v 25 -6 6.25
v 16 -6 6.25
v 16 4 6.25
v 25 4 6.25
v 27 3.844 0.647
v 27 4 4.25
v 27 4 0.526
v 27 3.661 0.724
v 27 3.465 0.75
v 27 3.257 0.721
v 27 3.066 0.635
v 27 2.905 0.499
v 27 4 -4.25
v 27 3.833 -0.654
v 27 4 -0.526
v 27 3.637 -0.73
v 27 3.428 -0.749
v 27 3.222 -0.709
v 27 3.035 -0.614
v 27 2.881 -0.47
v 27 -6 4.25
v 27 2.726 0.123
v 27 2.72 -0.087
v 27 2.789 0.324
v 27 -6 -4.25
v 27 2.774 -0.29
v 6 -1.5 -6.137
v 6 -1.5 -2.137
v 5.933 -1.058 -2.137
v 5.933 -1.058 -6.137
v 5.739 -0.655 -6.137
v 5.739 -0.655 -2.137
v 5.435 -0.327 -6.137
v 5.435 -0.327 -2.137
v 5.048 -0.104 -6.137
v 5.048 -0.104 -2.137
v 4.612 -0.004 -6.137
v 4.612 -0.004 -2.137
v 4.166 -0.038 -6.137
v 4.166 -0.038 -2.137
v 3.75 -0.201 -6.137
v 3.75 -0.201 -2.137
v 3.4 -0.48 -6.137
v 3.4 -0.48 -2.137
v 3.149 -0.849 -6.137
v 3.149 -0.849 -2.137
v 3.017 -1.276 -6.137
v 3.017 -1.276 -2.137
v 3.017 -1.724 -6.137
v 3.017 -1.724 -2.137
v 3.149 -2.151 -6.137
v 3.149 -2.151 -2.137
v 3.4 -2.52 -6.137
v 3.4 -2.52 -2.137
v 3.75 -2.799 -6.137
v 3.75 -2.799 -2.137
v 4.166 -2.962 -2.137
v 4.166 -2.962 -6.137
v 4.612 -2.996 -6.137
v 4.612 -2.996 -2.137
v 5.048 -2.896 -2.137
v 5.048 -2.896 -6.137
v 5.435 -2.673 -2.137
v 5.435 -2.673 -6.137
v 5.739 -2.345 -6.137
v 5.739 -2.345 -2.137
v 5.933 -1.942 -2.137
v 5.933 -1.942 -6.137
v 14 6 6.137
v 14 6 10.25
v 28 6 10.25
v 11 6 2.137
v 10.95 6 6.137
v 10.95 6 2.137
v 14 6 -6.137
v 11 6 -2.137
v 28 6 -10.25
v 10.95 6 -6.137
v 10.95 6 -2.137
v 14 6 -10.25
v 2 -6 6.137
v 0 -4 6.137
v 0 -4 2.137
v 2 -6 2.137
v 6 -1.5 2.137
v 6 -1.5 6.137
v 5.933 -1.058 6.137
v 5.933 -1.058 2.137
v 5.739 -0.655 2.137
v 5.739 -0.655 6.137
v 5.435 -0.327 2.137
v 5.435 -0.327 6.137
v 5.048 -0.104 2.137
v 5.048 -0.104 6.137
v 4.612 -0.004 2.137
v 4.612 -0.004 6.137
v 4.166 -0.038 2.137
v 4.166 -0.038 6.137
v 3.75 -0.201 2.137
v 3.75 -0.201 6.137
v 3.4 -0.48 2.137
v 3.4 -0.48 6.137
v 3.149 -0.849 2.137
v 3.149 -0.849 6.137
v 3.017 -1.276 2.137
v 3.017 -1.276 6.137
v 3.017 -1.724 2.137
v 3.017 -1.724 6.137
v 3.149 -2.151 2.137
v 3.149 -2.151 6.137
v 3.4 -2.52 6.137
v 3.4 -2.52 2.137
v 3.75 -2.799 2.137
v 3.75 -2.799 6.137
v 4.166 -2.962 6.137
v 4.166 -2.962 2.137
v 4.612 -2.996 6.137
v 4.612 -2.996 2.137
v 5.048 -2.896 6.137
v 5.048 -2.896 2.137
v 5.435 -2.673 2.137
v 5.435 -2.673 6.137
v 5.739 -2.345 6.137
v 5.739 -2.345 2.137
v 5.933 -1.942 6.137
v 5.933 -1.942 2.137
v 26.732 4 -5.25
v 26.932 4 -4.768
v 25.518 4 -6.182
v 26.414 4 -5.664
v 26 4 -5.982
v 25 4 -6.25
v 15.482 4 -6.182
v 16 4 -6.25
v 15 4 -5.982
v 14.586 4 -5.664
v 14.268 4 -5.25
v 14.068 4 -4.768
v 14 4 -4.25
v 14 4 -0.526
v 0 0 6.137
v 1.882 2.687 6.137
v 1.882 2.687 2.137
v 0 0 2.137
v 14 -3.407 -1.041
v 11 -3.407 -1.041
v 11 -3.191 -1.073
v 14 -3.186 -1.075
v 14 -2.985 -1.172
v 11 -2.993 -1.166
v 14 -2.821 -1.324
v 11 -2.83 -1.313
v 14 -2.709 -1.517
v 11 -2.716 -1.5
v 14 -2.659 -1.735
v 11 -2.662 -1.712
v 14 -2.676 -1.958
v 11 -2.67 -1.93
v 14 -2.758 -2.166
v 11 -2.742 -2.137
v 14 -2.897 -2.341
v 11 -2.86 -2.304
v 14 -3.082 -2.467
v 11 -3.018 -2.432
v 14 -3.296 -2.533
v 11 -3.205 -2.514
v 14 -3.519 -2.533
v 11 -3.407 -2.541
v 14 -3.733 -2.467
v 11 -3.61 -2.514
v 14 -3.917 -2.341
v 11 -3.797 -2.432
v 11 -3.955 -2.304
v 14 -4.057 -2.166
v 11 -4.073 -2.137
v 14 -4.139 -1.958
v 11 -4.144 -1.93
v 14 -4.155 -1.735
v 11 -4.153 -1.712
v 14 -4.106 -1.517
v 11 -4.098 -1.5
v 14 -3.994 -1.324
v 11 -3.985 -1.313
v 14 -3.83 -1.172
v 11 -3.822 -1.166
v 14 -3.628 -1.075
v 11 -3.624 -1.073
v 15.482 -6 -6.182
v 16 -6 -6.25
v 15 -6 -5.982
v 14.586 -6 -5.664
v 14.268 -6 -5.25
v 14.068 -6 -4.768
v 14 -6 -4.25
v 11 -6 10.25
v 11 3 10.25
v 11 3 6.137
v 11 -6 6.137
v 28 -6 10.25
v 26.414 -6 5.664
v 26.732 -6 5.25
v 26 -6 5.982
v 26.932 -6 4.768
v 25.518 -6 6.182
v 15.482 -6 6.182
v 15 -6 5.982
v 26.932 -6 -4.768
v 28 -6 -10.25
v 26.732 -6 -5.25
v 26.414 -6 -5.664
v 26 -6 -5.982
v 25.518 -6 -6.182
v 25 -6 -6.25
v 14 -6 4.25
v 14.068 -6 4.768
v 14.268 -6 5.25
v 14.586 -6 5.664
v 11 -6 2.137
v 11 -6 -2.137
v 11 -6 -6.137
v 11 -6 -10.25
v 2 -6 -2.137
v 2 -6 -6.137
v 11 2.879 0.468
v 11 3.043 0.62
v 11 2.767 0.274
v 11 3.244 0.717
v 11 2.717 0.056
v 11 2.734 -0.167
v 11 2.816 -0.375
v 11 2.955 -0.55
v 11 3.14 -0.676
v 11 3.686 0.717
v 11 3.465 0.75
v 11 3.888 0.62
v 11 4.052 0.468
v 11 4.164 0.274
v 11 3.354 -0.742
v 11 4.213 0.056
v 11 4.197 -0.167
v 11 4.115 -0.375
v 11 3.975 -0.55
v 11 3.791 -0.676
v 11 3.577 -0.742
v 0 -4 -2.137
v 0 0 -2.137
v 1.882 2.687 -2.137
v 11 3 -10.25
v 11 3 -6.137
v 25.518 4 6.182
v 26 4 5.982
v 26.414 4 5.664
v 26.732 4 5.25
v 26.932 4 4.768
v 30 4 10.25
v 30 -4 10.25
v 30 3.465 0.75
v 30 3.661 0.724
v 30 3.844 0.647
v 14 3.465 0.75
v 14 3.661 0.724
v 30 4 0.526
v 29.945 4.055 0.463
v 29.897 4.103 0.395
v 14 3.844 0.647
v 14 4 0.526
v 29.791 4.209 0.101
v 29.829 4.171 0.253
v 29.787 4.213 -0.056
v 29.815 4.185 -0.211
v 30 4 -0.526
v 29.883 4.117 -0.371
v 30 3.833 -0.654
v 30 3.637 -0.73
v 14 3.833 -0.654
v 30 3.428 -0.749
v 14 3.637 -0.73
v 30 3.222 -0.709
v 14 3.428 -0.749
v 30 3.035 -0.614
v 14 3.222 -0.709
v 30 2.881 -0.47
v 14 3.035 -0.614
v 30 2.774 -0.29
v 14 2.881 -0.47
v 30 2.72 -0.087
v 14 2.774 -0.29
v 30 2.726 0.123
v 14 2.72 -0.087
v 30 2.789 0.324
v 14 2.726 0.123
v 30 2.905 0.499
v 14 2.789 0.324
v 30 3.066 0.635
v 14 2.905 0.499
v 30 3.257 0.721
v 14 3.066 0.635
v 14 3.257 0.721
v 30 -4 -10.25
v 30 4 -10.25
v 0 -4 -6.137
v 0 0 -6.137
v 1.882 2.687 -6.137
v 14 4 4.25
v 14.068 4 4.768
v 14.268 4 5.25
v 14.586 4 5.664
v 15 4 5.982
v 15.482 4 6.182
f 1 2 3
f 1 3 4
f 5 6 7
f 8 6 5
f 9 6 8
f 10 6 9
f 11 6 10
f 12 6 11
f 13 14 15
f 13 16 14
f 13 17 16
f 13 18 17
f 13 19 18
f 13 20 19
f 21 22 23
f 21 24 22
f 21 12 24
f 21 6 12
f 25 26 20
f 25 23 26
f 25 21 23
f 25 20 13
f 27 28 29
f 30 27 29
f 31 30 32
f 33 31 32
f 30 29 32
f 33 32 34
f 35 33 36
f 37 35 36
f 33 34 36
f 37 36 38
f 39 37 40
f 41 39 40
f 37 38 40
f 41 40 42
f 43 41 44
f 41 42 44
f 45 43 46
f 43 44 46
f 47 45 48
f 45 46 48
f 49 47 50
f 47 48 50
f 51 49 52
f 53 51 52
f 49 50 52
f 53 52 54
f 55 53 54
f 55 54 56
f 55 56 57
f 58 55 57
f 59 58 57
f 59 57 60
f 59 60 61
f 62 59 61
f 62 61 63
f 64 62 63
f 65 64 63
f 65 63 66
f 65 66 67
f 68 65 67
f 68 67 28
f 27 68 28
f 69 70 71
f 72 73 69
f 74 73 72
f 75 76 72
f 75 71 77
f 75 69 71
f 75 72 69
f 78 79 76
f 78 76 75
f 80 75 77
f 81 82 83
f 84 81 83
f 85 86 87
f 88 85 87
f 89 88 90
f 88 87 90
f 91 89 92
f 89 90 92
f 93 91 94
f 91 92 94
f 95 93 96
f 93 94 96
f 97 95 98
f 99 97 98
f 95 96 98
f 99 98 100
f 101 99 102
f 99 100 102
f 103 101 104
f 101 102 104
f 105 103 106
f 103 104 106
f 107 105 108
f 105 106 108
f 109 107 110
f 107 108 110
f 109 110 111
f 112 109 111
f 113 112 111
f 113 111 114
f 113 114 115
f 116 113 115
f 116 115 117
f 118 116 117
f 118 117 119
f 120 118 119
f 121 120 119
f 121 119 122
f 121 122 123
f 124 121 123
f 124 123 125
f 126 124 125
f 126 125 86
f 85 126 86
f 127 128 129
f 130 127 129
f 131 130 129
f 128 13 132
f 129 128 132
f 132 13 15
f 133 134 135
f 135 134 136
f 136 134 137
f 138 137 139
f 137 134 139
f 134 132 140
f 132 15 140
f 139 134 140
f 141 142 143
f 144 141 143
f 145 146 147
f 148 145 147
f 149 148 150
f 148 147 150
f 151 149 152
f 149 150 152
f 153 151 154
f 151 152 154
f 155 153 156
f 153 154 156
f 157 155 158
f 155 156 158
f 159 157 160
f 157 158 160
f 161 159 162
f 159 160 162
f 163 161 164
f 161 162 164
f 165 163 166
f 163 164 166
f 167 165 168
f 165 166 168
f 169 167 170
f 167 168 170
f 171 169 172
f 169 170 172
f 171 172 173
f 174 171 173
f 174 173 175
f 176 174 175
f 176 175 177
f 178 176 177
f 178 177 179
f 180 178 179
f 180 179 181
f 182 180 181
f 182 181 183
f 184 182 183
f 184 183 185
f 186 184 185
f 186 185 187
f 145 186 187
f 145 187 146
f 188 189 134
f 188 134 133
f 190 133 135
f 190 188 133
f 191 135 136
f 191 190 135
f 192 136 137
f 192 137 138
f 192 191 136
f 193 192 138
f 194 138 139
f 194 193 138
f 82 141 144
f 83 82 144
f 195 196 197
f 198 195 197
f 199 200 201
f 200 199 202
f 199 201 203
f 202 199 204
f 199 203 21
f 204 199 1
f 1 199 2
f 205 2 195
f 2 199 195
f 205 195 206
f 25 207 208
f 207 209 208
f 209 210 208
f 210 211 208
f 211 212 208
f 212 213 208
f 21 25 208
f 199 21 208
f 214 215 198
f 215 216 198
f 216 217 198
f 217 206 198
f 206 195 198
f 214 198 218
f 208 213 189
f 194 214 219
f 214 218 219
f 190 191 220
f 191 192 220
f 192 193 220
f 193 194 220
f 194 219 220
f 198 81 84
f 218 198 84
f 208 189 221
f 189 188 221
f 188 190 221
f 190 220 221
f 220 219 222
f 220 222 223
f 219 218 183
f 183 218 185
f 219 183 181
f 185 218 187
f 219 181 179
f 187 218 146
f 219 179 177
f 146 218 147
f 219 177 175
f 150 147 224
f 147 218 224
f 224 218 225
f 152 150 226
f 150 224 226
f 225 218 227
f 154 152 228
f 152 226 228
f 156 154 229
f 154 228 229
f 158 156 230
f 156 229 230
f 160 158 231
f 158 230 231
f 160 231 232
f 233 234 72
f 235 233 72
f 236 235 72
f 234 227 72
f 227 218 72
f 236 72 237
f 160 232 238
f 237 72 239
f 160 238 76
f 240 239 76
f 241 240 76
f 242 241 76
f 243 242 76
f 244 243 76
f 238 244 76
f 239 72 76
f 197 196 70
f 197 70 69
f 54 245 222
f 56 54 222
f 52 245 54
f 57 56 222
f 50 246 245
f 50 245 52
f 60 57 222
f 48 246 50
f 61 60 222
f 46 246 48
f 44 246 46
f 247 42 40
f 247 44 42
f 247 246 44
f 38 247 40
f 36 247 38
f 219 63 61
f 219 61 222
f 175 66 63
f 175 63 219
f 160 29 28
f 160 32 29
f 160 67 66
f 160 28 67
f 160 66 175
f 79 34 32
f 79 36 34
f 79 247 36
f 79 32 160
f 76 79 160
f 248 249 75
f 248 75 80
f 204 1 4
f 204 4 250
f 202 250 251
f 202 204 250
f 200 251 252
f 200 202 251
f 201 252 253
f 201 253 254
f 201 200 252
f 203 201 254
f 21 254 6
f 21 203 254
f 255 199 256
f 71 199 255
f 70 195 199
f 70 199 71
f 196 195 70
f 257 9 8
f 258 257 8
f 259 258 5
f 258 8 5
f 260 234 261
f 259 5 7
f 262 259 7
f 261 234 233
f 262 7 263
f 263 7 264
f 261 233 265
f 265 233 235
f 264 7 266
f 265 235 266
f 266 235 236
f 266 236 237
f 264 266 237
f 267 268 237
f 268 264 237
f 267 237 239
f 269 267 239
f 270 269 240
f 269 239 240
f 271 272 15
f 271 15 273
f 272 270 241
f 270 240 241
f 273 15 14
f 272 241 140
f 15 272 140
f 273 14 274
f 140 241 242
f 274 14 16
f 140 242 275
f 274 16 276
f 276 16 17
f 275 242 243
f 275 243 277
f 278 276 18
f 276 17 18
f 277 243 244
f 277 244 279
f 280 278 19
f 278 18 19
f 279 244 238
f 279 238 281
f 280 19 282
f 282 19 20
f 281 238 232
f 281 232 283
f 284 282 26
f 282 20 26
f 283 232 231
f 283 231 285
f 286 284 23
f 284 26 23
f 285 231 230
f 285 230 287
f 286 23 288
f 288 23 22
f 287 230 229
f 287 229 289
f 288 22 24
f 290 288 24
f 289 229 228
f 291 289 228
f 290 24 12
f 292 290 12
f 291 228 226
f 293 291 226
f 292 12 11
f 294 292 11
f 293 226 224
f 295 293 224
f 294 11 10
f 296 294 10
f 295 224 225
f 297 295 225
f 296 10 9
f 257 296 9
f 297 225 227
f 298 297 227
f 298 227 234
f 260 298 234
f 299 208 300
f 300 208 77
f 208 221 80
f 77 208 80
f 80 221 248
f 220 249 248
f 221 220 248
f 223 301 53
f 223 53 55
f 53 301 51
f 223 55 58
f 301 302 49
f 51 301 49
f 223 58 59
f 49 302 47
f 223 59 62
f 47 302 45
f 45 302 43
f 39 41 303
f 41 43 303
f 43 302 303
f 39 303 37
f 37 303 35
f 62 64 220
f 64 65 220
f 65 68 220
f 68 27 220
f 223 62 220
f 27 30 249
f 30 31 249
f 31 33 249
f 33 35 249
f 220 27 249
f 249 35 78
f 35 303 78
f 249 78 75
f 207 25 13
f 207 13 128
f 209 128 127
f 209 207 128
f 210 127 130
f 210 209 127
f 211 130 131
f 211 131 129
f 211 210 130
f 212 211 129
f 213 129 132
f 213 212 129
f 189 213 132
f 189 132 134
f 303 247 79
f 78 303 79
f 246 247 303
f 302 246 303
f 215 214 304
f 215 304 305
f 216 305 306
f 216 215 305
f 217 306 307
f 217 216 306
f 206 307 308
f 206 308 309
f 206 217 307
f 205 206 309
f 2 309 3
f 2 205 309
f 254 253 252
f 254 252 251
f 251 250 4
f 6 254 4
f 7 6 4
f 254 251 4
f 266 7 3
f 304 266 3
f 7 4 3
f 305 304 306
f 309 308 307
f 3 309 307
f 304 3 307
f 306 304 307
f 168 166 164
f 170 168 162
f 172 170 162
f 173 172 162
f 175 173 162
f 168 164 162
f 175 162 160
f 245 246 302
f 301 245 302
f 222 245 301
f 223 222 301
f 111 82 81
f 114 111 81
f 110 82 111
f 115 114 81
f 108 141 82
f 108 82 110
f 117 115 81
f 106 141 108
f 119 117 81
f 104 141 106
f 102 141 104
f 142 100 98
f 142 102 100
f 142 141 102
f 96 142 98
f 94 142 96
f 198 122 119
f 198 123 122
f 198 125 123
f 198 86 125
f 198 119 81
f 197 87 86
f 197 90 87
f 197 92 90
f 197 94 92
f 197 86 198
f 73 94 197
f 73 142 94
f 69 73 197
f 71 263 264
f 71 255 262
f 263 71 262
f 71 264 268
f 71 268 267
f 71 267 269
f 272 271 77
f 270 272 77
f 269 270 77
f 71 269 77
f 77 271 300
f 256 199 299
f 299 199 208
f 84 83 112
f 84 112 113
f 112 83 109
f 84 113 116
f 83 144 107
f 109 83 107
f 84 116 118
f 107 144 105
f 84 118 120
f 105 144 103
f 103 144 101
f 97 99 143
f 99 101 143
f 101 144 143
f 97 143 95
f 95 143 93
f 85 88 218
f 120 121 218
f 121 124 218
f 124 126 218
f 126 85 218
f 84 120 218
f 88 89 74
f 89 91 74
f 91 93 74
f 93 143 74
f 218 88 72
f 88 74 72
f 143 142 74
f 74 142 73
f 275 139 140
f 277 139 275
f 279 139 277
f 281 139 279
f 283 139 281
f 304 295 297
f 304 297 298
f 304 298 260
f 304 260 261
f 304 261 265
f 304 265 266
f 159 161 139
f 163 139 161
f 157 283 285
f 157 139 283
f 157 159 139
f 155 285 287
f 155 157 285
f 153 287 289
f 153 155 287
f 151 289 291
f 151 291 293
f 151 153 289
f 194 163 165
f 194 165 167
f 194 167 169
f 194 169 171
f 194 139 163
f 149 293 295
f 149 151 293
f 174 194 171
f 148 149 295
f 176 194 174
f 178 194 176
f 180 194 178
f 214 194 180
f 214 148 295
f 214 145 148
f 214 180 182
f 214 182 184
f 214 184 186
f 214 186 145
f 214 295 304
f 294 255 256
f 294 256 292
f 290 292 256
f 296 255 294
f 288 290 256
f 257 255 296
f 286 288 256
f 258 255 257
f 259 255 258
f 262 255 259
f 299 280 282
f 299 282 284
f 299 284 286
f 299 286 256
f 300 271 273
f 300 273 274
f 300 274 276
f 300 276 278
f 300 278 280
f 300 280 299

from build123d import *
from OCP.BRepFilletAPI import BRepFilletAPI_MakeChamfer

# Parameters (mm, degrees)
SKETCH_2_W          = 20.5
SKETCH_2_H          = 12
EXTRUDE_1_DEPTH     = 30
SKETCH_3_W          = 22
SKETCH_3_H          = 4.27428741
CUT_EXTRUDE_1_DEPTH = 34.897824414
SKETCH_10_W         = 17.106520138
SKETCH_10_H         = 9.063555791
CUT_EXTRUDE_3_DEPTH = 34.897824414
SKETCH_11_R         = 1.5
CUT_EXTRUDE_6_DEPTH = 35.706461629
SKETCH_12_R         = 0.75
CUT_EXTRUDE_4_DEPTH = 12
CUT_EXTRUDE_7_DEPTH = 37.827299657
CHAMFER_5_SIZE      = 2
CHAMFER_6_SIZE      = 2
CHAMFER_6_SIZE2     = 2.003351387
SKETCH_14_R         = 0.75
CUT_EXTRUDE_5_DEPTH = 23.406751215
CHAMFER_8_SIZE      = 3
CUT_EXTRUDE_8_DEPTH = 10


with BuildPart() as part:
    # Эскиз2 → Вытянуть1 (new body)
    with BuildSketch(Plane(origin=(0, 0, 0), x_dir=(0, 0, -1), z_dir=(1, 0, 0))):
        Rectangle(SKETCH_2_W, SKETCH_2_H)
    extrude(amount=EXTRUDE_1_DEPTH)

    # Эскиз3 → Вырез-Вытянуть1 (cut, through all)
    with BuildSketch(Plane(origin=(0, 6, 0), x_dir=(1, 0, 0), z_dir=(0, 1, 0))):
        Rectangle(SKETCH_3_W, SKETCH_3_H)
    extrude(amount=-CUT_EXTRUDE_1_DEPTH, mode=Mode.SUBTRACT)

    # Эскиз10 → Вырез-Вытянуть3 (cut, through all)
    with BuildSketch(Plane(origin=(0, 6, 0), x_dir=(1, 0, 0), z_dir=(0, 1, 0))):
        with Locations((2.446739931, 10.668921601)):
            Rectangle(SKETCH_10_W, SKETCH_10_H)
        with Locations((2.446739931, -10.668921601)):
            Rectangle(SKETCH_10_W, SKETCH_10_H)
    extrude(amount=-CUT_EXTRUDE_3_DEPTH, mode=Mode.SUBTRACT)

    # Эскиз11 → Вытянуть6 (cut, through all)
    with BuildSketch(Plane.XY.offset(6.137143705)):
        with Locations((4.5, -1.5)):
            Circle(SKETCH_11_R)
    extrude(amount=-CUT_EXTRUDE_6_DEPTH, mode=Mode.SUBTRACT)

    # Эскиз12 → Вырез-Вытянуть4 (cut)
    with BuildSketch(Plane.ZY.offset(-11)):
        with Locations((-1.791386219, -3.407348241)):
            Circle(SKETCH_12_R)
    extrude(amount=-CUT_EXTRUDE_4_DEPTH, mode=Mode.SUBTRACT)

    # Эскиз13 → Вытянуть7 (cut, through all)
    with BuildSketch(Plane.XY.offset(10.25)):
        Polygon((10.95, 6), (0, 6), (0, 2), align=None)
        Polygon((40.005782236, 6), (40.005782236, 2), (30.005782236, 6), align=None)
    extrude(amount=-CUT_EXTRUDE_7_DEPTH, mode=Mode.SUBTRACT)

    # Фаска5
    chamfer_5_edges = [part.edges().sort_by_distance(p)[0] for p in [
        (30, -6, 0),
        (0, -6, -4.137143705),
        (0, -6, 4.137143705),
        (30, 6, 0),
    ]]
    chamfer(chamfer_5_edges, length=CHAMFER_5_SIZE)

    # Фаска6: one chamfer whose edges measure the first distance from different faces: ONE call of the kernel's chamfer builder (chamfer() names one face for all edges)
    chamfer_6_edges_1 = [part.edges().sort_by_distance(p)[0] for p in [
        (0, 2, 4.137143705),
    ]]
    chamfer_6_side_1 = [part.faces().sort_by_distance(p)[0] for p in [
        (0, -1, 4.137143705),
    ]]
    chamfer_6_edges_2 = [part.edges().sort_by_distance(p)[0] for p in [
        (0, 2, -4.137143705),
    ]]
    chamfer_6_side_2 = [part.faces().sort_by_distance(p)[0] for p in [
        (0, -1, -4.137143705),
    ]]
    chamfer_6 = BRepFilletAPI_MakeChamfer(part.part.solid().wrapped)
    for e in chamfer_6_edges_1:
        chamfer_6.Add(CHAMFER_6_SIZE, CHAMFER_6_SIZE2, e.wrapped, chamfer_6_side_1[0].wrapped)  # the first distance lies on this face
    for e in chamfer_6_edges_2:
        chamfer_6.Add(CHAMFER_6_SIZE, CHAMFER_6_SIZE2, e.wrapped, chamfer_6_side_2[0].wrapped)  # the first distance lies on this face
    add(Compound.cast(chamfer_6.Shape()), mode=Mode.REPLACE)

    # Эскиз14 → Вырез-Вытянуть5 (cut, through all)
    with BuildSketch(Plane.ZY.offset(-11)):
        with Locations((0, 3.465363476)):
            Circle(SKETCH_14_R)
    extrude(amount=-CUT_EXTRUDE_5_DEPTH, mode=Mode.SUBTRACT)

    # Фаска8
    chamfer_8_edges = [part.edges().sort_by_distance(p)[0] for p in [
        (11, 6, -8.193571852),
        (11, 6, 8.193571852),
    ]]
    chamfer(chamfer_8_edges, length=CHAMFER_8_SIZE)

    # Эскиз15 → Вытянуть8 (cut)
    with BuildSketch(Plane.XZ.offset(6)):
        with BuildLine():
            Line((16, 6.25), (25, 6.25))
            ThreePointArc((25, 6.25), (26.414213562, 5.664213562), (27, 4.25))
            Line((27, 4.25), (27, -4.25))
            ThreePointArc((27, -4.25), (26.414213562, -5.664213562), (25, -6.25))
            Line((25, -6.25), (16, -6.25))
            ThreePointArc((16, -6.25), (14.585786438, -5.664213562), (14, -4.25))
            Line((14, -4.25), (14, 4.25))
            ThreePointArc((14, 4.25), (14.585786438, 5.664213562), (16, 6.25))
        make_face()
    extrude(amount=-CUT_EXTRUDE_8_DEPTH, mode=Mode.SUBTRACT)


solid = part.part
